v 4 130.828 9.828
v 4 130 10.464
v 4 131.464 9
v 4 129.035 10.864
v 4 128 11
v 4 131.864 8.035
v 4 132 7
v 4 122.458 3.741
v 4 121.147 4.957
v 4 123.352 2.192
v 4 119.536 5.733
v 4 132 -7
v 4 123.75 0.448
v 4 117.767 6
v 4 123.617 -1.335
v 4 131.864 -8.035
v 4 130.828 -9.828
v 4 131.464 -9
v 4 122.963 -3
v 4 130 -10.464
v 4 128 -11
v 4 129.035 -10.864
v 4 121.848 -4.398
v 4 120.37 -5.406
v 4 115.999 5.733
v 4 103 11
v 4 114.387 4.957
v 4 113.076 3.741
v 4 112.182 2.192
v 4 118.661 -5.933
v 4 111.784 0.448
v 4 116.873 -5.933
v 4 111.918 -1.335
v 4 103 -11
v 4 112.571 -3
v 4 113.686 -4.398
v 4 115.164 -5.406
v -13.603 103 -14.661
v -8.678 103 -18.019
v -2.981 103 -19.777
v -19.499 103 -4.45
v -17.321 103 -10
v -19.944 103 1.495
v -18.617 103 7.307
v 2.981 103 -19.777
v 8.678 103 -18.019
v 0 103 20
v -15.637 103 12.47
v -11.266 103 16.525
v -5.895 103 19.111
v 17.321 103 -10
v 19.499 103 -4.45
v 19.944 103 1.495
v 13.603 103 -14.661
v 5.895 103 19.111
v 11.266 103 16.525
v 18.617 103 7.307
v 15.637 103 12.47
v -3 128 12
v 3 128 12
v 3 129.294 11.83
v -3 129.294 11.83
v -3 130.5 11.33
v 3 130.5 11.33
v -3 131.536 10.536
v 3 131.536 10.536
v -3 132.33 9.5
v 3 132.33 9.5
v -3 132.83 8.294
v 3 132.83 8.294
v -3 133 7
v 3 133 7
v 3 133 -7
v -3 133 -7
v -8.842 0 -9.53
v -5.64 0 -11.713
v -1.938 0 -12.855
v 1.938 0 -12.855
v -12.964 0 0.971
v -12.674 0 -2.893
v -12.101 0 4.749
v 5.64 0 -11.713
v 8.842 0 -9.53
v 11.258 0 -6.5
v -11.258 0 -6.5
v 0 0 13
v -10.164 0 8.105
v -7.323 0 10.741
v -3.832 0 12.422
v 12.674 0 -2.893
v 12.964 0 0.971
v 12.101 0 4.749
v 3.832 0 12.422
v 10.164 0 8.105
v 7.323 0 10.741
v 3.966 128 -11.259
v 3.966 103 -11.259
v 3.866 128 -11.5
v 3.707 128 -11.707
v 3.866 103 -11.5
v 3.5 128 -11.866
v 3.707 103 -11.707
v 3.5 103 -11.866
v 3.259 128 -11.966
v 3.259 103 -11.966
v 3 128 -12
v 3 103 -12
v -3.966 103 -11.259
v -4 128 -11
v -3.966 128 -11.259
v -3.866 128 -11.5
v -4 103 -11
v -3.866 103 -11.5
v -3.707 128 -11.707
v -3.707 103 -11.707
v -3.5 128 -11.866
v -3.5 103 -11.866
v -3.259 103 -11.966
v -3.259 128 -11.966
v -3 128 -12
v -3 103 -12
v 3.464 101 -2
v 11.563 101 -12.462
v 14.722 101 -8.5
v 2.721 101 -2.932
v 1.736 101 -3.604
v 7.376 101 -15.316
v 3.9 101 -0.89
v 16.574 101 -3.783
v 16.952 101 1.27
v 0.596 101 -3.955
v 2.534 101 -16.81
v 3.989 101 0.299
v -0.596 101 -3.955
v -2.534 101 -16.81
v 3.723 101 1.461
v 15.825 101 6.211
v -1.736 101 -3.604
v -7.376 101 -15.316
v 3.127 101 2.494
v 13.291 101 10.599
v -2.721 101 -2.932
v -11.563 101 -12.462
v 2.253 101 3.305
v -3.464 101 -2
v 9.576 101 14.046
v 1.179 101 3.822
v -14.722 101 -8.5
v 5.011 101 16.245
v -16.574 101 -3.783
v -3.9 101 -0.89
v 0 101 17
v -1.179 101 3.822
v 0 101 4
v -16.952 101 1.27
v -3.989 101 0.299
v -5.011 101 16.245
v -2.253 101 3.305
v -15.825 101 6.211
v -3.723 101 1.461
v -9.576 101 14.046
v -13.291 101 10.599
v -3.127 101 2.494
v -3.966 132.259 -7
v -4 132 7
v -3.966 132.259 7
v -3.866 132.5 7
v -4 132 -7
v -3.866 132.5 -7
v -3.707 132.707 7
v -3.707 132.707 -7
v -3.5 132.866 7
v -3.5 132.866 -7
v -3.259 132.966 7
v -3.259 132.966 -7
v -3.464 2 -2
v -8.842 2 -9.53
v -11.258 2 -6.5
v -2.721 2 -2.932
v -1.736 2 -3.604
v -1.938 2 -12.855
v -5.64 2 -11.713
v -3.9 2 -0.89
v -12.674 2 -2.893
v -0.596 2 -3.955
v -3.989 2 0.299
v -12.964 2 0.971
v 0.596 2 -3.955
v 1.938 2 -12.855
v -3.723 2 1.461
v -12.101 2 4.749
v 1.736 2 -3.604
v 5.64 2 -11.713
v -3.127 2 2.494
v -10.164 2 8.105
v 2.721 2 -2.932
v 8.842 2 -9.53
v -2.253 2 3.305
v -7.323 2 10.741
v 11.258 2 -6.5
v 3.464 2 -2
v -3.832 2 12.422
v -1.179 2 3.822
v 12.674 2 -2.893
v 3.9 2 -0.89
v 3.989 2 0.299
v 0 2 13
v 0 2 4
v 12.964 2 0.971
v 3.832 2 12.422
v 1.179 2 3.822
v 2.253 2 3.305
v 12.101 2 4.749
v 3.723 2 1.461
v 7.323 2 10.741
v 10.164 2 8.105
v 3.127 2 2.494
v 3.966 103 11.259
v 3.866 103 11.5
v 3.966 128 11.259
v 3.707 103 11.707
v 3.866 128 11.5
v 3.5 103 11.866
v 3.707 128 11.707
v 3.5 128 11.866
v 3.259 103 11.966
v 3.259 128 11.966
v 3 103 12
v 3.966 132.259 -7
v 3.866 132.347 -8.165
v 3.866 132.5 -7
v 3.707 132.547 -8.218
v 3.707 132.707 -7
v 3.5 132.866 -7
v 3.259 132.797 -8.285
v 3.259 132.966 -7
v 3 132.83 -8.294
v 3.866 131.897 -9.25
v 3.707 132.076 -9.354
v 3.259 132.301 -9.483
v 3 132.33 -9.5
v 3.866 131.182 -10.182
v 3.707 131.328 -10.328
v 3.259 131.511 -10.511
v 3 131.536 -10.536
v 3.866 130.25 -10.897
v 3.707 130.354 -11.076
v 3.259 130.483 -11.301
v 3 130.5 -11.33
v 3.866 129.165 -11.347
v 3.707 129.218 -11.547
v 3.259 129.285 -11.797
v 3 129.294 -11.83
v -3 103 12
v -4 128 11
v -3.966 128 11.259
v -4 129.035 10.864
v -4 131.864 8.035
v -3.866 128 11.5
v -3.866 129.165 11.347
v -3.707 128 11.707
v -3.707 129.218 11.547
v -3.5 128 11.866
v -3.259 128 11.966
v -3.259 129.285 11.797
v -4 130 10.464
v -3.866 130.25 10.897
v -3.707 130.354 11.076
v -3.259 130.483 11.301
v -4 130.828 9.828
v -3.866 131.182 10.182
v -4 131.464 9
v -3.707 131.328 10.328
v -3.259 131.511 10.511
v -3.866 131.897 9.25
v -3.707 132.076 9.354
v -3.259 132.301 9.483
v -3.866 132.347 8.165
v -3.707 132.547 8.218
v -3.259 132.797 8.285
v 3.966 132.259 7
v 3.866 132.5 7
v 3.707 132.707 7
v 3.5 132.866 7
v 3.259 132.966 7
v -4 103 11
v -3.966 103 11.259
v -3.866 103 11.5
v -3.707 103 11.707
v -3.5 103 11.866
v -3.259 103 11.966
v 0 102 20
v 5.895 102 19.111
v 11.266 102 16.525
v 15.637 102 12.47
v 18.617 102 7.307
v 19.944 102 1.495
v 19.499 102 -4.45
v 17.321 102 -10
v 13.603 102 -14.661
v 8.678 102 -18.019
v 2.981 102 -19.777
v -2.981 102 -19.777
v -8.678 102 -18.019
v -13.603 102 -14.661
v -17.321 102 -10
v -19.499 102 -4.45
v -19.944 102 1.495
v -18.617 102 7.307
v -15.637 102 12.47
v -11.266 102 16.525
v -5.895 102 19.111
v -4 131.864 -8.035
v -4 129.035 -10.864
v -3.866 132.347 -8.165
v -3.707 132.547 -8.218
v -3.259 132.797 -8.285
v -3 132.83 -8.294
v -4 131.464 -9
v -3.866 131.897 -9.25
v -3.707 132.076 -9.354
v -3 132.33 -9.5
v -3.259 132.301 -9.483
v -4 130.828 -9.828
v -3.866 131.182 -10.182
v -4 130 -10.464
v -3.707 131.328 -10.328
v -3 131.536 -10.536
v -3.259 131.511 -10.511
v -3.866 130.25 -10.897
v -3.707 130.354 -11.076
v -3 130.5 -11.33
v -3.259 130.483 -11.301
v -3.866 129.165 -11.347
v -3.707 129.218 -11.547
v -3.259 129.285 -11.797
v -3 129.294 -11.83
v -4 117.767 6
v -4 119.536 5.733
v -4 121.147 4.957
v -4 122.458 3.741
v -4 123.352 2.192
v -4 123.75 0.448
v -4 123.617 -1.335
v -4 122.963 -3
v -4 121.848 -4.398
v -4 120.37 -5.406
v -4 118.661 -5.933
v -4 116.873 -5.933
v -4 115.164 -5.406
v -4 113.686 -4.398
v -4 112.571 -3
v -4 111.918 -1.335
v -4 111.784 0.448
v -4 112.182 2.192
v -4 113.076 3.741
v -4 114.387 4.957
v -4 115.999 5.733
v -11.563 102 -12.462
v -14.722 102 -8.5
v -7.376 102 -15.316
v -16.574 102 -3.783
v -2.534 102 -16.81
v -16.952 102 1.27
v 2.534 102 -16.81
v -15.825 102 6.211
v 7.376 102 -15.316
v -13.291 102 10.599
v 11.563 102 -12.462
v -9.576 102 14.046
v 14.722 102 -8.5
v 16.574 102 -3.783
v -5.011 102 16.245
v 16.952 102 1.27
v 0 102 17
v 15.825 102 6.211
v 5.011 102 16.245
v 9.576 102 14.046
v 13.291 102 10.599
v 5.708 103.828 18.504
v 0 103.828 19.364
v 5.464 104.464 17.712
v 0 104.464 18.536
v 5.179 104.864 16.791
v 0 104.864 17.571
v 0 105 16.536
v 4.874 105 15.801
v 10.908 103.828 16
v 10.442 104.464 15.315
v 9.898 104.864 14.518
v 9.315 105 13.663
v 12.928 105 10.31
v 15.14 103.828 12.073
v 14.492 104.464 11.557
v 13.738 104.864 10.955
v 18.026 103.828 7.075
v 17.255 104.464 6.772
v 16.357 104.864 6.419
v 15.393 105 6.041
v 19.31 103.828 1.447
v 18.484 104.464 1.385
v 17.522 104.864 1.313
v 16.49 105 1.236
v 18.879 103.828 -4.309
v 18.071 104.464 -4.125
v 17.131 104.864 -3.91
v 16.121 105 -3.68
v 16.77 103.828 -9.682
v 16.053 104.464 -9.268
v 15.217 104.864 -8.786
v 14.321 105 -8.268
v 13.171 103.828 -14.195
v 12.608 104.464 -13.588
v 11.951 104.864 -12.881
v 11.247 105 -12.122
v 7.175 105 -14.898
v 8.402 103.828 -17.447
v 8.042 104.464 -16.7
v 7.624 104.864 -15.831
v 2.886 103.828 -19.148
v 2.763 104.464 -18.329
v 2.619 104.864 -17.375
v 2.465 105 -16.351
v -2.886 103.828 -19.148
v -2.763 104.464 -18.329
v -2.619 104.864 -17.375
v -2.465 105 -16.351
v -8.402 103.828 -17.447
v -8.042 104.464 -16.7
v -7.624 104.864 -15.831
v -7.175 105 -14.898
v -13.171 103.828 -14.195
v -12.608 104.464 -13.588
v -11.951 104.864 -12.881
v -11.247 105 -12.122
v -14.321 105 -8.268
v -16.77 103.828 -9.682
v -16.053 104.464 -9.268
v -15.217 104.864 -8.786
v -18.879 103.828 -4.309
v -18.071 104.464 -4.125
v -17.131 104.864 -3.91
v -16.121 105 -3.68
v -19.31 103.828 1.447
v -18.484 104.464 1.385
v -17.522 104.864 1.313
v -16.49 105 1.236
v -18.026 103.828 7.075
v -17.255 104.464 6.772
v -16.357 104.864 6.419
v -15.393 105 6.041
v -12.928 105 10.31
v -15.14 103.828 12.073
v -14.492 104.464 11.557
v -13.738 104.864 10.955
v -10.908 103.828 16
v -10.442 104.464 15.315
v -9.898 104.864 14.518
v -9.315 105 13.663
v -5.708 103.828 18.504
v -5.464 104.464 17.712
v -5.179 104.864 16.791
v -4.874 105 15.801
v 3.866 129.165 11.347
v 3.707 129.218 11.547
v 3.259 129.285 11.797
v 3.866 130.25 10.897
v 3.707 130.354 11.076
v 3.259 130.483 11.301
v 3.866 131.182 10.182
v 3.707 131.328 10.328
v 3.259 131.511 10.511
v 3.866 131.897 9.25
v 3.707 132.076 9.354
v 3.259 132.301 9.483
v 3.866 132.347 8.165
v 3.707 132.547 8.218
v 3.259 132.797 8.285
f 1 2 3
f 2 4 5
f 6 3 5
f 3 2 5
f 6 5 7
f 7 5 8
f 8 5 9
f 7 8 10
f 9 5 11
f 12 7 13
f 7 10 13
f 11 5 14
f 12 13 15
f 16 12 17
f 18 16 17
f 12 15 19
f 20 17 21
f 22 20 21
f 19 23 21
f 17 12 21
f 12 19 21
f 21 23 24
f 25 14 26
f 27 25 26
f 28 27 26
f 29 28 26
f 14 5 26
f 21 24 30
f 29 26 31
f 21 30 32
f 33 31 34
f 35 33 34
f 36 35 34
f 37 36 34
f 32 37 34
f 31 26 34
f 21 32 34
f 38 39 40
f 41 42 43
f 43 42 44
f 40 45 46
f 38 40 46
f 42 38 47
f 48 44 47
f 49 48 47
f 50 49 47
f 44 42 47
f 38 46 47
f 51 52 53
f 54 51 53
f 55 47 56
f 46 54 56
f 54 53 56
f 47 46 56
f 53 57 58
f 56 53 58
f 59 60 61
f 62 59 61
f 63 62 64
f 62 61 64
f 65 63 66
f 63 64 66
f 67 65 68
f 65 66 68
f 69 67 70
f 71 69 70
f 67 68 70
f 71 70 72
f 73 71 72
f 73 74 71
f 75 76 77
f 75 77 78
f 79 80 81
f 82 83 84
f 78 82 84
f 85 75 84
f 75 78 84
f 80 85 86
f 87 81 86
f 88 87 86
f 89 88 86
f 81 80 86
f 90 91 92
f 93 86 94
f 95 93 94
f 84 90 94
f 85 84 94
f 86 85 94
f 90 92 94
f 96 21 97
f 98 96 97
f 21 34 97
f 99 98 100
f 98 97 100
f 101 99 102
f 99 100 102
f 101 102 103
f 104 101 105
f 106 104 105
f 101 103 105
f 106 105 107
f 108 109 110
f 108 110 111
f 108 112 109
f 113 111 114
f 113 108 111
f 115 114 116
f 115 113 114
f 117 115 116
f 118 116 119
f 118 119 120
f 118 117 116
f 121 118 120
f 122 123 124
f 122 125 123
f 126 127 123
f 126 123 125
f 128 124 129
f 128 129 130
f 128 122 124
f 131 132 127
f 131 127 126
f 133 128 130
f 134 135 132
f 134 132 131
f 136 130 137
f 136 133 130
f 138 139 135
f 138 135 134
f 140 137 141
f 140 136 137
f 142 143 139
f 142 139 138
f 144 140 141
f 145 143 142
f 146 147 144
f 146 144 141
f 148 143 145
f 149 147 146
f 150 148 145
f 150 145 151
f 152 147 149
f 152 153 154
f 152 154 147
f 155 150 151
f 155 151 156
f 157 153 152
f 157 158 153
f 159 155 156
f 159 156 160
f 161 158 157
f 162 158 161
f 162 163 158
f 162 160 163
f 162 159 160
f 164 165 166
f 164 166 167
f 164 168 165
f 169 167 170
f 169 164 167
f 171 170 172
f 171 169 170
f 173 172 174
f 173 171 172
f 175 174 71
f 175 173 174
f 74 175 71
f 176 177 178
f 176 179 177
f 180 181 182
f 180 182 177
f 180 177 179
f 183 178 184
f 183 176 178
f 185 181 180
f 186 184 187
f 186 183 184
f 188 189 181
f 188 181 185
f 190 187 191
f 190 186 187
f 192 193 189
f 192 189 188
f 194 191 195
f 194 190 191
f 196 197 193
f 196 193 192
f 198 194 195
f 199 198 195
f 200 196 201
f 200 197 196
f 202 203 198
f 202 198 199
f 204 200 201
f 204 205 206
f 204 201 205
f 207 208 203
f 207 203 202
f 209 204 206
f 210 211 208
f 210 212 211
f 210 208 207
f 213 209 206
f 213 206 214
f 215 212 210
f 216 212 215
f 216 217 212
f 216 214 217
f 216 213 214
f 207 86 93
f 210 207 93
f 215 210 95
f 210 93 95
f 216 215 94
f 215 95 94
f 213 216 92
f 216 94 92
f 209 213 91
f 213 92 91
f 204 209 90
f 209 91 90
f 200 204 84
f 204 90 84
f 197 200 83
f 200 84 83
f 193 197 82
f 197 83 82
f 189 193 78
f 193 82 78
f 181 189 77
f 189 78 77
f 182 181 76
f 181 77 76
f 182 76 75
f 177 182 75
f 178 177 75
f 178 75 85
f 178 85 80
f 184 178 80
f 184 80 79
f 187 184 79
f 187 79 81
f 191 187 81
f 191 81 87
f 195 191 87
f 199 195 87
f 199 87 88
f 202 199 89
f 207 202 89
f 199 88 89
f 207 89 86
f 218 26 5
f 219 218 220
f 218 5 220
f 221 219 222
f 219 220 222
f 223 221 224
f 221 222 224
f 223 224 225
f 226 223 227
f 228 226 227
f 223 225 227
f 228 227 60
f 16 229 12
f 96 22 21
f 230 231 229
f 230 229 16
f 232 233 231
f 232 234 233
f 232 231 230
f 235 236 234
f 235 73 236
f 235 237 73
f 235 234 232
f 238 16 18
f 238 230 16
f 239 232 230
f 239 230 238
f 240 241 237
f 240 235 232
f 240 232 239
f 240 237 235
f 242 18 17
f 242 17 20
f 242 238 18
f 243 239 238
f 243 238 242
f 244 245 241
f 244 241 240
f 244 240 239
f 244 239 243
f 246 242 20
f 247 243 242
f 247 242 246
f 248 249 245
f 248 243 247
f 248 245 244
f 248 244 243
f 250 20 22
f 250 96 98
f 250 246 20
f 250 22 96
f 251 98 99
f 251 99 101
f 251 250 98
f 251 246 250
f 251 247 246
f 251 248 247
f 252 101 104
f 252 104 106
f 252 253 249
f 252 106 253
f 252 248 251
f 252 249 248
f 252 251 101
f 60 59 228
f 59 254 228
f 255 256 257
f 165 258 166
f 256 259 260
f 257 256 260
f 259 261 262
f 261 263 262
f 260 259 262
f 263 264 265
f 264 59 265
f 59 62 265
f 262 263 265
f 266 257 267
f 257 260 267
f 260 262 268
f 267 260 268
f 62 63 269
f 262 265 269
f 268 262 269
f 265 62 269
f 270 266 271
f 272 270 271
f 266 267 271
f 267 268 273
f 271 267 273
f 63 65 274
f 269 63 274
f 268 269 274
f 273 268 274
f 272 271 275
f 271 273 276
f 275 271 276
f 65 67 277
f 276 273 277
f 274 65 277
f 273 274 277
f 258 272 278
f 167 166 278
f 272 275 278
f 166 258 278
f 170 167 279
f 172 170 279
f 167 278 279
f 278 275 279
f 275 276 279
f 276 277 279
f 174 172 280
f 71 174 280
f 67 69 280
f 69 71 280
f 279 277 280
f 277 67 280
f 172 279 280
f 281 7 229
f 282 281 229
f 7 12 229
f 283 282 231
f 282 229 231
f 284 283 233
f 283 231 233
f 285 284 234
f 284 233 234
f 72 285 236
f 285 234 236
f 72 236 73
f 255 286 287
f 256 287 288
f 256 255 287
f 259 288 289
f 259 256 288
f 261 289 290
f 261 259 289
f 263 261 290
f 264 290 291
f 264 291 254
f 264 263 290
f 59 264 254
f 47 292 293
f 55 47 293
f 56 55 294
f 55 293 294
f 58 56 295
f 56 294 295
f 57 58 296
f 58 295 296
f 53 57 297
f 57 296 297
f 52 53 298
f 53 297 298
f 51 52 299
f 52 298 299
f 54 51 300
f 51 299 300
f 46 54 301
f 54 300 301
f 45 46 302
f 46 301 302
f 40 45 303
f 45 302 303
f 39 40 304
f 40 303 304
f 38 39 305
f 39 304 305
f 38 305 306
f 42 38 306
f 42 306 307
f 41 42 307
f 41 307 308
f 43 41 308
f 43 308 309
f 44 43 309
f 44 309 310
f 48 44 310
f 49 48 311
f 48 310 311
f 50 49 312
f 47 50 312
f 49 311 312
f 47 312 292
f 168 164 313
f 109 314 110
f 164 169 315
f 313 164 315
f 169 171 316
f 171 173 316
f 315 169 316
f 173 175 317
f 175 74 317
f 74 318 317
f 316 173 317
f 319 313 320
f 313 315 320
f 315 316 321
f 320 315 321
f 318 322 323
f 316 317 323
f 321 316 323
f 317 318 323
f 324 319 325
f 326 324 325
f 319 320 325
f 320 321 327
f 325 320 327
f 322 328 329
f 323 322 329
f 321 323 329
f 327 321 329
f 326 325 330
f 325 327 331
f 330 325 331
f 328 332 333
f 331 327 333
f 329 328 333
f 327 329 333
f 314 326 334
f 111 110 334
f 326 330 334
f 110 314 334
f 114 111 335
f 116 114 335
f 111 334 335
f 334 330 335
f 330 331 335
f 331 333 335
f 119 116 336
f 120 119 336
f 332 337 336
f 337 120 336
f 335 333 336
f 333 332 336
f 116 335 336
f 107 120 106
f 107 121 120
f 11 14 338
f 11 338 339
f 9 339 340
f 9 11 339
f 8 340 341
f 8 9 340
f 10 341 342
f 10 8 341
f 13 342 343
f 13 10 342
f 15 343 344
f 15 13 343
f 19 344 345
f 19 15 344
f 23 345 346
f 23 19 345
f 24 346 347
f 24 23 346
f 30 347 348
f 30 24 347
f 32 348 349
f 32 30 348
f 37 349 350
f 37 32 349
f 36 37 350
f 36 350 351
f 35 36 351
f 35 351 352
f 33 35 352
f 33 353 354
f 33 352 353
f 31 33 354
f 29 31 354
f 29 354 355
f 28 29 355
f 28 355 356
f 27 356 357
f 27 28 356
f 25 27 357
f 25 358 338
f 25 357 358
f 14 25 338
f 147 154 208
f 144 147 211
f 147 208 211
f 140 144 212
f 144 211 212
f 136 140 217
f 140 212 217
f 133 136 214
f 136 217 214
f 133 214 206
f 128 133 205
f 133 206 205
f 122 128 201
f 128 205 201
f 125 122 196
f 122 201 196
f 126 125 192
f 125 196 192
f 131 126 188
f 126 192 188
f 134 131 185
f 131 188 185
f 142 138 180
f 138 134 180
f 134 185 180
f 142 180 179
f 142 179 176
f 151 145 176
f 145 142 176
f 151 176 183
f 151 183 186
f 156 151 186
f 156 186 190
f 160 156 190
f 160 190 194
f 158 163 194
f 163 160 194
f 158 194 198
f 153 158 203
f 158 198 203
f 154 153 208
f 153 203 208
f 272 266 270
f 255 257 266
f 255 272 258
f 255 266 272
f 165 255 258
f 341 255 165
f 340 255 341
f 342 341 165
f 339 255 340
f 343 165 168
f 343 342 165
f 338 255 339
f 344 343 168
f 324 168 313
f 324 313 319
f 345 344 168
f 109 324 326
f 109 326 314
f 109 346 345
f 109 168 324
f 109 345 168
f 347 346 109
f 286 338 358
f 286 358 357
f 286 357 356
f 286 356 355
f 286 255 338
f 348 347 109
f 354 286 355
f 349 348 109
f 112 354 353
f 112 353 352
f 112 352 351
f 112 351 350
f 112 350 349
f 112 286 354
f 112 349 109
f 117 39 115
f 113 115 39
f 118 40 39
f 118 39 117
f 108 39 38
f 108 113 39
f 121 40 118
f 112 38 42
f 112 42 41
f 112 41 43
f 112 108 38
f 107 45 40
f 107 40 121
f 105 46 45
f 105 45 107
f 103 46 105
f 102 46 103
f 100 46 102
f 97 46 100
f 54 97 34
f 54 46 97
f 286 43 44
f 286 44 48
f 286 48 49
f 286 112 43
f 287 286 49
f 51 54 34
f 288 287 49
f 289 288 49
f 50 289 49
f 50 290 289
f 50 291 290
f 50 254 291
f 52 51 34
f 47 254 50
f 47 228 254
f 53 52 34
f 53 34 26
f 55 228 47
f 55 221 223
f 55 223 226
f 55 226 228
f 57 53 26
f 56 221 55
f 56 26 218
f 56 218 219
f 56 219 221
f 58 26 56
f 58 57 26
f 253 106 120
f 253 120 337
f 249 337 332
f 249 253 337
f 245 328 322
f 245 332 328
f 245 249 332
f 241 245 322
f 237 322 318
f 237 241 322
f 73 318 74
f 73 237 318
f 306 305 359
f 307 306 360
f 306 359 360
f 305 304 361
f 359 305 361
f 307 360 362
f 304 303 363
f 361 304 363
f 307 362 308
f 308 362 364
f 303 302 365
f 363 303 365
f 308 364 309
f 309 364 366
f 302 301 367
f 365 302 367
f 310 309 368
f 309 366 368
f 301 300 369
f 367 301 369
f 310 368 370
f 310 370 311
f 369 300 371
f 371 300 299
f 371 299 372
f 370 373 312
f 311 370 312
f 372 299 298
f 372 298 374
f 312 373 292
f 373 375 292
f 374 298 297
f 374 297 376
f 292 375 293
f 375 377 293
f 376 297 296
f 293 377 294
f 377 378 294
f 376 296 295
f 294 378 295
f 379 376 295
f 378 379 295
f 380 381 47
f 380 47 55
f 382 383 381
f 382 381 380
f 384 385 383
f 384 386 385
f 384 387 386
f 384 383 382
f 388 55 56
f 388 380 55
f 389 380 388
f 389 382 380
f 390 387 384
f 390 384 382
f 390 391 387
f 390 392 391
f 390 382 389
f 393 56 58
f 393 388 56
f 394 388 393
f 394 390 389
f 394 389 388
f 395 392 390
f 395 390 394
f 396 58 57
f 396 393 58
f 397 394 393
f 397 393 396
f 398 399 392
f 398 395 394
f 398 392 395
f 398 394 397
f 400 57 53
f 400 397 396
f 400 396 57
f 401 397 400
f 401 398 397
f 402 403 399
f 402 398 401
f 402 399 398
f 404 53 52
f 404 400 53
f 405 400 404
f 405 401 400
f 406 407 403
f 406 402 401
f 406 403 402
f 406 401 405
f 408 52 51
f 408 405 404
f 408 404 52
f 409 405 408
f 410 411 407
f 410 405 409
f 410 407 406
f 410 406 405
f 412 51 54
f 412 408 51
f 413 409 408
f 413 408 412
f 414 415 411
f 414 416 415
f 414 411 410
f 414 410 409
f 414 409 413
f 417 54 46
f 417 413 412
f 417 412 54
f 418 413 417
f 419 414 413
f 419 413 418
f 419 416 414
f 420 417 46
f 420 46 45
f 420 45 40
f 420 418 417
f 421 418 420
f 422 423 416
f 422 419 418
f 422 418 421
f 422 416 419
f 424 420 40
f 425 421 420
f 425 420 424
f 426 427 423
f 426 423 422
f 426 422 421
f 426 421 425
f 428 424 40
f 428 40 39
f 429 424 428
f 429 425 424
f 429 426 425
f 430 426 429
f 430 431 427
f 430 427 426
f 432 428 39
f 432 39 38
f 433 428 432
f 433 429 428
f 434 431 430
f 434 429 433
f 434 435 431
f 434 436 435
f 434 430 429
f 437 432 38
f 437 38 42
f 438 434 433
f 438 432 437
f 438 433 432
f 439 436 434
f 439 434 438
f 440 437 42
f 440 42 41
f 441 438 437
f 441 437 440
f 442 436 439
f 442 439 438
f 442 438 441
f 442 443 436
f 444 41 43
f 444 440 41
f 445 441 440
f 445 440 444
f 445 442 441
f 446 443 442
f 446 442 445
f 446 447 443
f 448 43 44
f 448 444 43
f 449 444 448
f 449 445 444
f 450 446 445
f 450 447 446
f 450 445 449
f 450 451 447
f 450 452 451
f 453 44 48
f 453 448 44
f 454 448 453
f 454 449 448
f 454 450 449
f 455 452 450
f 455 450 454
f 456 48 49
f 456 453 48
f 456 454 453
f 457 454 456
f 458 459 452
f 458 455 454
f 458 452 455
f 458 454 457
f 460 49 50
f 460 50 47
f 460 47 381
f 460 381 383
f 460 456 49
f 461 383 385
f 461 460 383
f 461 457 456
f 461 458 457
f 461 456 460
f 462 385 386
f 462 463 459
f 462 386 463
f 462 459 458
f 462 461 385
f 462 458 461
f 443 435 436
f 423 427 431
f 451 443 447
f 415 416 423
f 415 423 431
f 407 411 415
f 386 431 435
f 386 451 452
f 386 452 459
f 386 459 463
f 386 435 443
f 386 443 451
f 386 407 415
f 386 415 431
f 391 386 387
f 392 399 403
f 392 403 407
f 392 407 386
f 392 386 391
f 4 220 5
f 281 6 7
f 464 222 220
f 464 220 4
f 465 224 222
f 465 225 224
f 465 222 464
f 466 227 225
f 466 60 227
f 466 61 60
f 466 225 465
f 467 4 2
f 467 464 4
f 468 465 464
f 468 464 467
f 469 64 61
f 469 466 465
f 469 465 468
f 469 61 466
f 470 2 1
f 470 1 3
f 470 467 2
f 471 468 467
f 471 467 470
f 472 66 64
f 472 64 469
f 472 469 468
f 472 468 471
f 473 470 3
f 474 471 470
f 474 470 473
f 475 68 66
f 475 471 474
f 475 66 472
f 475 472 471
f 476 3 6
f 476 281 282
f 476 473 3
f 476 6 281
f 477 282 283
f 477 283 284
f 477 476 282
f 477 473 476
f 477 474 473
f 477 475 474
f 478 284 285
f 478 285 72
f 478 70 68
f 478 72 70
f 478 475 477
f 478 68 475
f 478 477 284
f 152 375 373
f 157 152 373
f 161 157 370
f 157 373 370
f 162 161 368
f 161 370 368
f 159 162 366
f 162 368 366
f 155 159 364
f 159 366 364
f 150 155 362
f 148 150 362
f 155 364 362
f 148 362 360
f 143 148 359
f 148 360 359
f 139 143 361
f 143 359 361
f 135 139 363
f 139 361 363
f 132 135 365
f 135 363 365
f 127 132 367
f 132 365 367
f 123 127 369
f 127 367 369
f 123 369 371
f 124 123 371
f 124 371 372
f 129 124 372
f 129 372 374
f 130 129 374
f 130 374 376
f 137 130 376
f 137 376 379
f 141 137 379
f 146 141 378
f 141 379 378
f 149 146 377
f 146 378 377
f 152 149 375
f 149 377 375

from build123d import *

# Parameters (mm, degrees)
SKETCH1_R               = 13
BOSS_EXTRUDE1_DEPTH     = 2
SKETCH2_R               = 4
BOSS_EXTRUDE2_DEPTH     = 100
SKETCH3_R               = 20
BOSS_EXTRUDE3_DEPTH     = 1
SKETCH4_R               = 17
BOSS_EXTRUDE4_DEPTH     = 1
SKETCH5_W               = 8
SKETCH5_H               = 24
BOSS_EXTRUDE5_DEPTH     = 30
SKETCH6_R               = 20
BOSS_EXTRUDE6_DEPTH     = 2
FILLET1_R               = 4
FILLET3_R               = 5
FILLET4_R               = 1
CUT_EXTRUDE1_DEPTH      = 136.97426227
CUT_EXTRUDE1_DEPTH_BACK = 136.97426227
SKETCH11_R              = 6


with BuildPart() as part:
    # Sketch1 → Boss-Extrude1 (new body)
    with BuildSketch(Plane(origin=(0, 0, 0), x_dir=(1, 0, 0), z_dir=(0, 1, 0))):
        with Locations(Location((0, 0, 0), (0, 0, 270))):
            Circle(SKETCH1_R)
    extrude(amount=BOSS_EXTRUDE1_DEPTH)

    # Sketch2 → Boss-Extrude2 (add)
    with BuildSketch(Plane(origin=(0, 2, 0), x_dir=(1, 0, 0), z_dir=(0, 1, 0))):
        with Locations(Location((0, 0, 0), (0, 0, 270))):
            Circle(SKETCH2_R)
    extrude(amount=BOSS_EXTRUDE2_DEPTH)

    # Sketch3 → Boss-Extrude3 (add)
    with BuildSketch(Plane(origin=(0, 102, 0), x_dir=(1, 0, 0), z_dir=(0, 1, 0))):
        with Locations(Location((0, 0, 0), (0, 0, 270))):
            Circle(SKETCH3_R)
    extrude(amount=BOSS_EXTRUDE3_DEPTH)

    # Sketch4 → Boss-Extrude4 (add)
    with BuildSketch(Plane.XZ.offset(-102)):
        with Locations(Location((0, 0, 0), (0, 0, 90))):
            Circle(SKETCH4_R)
    extrude(amount=BOSS_EXTRUDE4_DEPTH)

    # Sketch5 → Boss-Extrude5 (add)
    with BuildSketch(Plane(origin=(0, 103, 0), x_dir=(1, 0, 0), z_dir=(0, 1, 0))):
        Rectangle(SKETCH5_W, SKETCH5_H)
    extrude(amount=BOSS_EXTRUDE5_DEPTH)

    # Fillet3
    fillet3_edges = [part.edges().sort_by_distance(p)[0] for p in [
        (0, 133, 12),
        (0, 133, -12),
    ]]
    fillet(fillet3_edges, radius=FILLET3_R)

    # Fillet4
    fillet4_edges = [part.edges().sort_by_distance(p)[0] for p in [
        (-4, 133, 0),
        (4, 133, 0),
        (-4, 115.5, 12),
        (-4, 115.5, -12),
        (-4, 131.535533906, 10.535533906),
        (-4, 131.535533906, -10.535533906),
        (4, 115.5, -12),
        (4, 115.5, 12),
        (4, 131.535533906, 10.535533906),
        (4, 131.535533906, -10.535533906),
    ]]
    fillet(fillet4_edges, radius=FILLET4_R)

    # Sketch11 → Cut-Extrude1 (cut, two sides: drawn at the far end of the back side and taken through both)
    with BuildSketch(Plane.ZY.offset(-CUT_EXTRUDE1_DEPTH_BACK)):
        with Locations((0, 117.767190526)):
            Circle(SKETCH11_R)
    extrude(amount=CUT_EXTRUDE1_DEPTH + CUT_EXTRUDE1_DEPTH_BACK, mode=Mode.SUBTRACT)


with BuildPart() as body_2:
    # Sketch6 → Boss-Extrude6 (new body)
    with BuildSketch(Plane(origin=(0, 103, 0), x_dir=(1, 0, 0), z_dir=(0, 1, 0))):
        with Locations(Location((0, 0, 0), (0, 0, 270))):
            Circle(SKETCH6_R)
    extrude(amount=BOSS_EXTRUDE6_DEPTH)

    # Fillet1
    # the kernel refuses this fillet: 4 mm, written as the material it takes off along each edge
    with BuildSketch(Plane(origin=(0, 105, 0), x_dir=(0, 0, 1), z_dir=(-1, 0, 0))) as fillet1_piece_1:
        with BuildLine():
            CenterArc((16.535898385, -4), FILLET1_R, 30, 60)
            Line((16.535898385, 0), (16.535898385, 0.08))
            Line((16.535898385, 0.08), (20, 0.08))
            Line((20, 0.08), (20.08, 0))
            ThreePointArc((20.08, 0), (20.08, -1), (20.069282032, -1.96))
            Line((20.069282032, -1.96), (20, -2))
        make_face()
    revolve(axis=Axis((0, 105, 0), (0, 1, 0)), mode=Mode.SUBTRACT)


solid = Compound([part.part, body_2.part])
